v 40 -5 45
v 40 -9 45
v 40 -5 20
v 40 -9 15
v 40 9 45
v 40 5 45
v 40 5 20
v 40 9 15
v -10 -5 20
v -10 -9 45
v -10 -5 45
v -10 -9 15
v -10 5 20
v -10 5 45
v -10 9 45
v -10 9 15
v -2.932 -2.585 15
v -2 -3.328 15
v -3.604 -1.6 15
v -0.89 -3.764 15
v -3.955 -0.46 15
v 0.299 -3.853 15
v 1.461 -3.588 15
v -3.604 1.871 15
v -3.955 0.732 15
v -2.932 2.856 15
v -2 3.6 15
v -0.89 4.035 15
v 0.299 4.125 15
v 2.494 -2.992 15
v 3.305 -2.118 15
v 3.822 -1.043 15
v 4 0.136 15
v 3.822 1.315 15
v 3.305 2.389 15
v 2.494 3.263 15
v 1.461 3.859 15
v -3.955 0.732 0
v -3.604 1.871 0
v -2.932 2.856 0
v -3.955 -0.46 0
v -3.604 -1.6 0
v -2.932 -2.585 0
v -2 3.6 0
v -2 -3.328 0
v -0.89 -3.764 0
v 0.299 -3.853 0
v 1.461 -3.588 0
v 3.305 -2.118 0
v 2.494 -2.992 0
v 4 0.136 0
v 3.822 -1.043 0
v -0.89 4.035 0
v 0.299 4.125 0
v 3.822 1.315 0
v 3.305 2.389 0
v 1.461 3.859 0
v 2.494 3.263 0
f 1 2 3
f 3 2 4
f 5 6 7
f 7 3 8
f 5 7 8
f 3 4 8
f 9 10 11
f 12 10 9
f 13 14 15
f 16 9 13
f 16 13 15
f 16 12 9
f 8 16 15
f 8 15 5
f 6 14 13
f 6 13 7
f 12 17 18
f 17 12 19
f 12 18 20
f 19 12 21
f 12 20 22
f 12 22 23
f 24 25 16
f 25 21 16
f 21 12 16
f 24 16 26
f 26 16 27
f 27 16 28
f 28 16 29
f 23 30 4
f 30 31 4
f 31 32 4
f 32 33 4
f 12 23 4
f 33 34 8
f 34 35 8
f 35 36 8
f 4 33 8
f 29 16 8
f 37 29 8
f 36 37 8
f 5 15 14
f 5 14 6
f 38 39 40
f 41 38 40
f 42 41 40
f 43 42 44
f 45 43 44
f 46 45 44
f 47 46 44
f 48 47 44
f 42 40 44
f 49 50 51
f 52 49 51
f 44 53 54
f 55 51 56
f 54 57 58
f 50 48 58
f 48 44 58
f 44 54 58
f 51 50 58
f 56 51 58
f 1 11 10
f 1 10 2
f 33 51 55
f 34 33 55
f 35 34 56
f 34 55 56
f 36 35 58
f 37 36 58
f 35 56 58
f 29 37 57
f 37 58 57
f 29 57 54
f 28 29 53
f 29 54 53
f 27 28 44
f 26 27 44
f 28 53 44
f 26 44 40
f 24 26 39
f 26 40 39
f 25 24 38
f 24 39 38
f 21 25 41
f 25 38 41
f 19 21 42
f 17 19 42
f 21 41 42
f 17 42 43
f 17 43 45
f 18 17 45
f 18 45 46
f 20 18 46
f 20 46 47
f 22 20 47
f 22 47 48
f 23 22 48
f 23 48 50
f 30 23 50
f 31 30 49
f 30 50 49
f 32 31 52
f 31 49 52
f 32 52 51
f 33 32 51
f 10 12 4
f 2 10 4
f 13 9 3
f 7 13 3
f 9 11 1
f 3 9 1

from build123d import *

# Parameters (mm, degrees)
F0_R     = 4
F1_DEPTH = 15
F2_W     = 50
F2_H     = 18
F2_R     = 4
F3_DEPTH = 30
F4_W     = 50
F4_H     = 25
F5_DEPTH = 5


with BuildPart() as f1:
    # F0 (on Top) → F1 (new body)
    with BuildSketch(Plane.XY):
        with Locations((0, 0.135727)):
            Circle(F0_R)
    extrude(amount=F1_DEPTH)

    # F2 (on face) → F3 (join)
    with BuildSketch(Plane.XY.offset(15)):
        with Locations((15, 0)):
            Rectangle(F2_W, F2_H)
        with Locations((0, 0.135727)):
            Circle(F2_R, mode=Mode.SUBTRACT)
        with Locations((0, 0.135727)):
            Circle(F2_R)
    extrude(amount=F3_DEPTH)

    # F4 (on Front) → F5 (cut, symmetric)
    with BuildSketch(Plane.XZ):
        with Locations((15, 32.5)):
            Rectangle(F4_W, F4_H)
    extrude(amount=F5_DEPTH, both=True, mode=Mode.SUBTRACT)


solid = f1.part
